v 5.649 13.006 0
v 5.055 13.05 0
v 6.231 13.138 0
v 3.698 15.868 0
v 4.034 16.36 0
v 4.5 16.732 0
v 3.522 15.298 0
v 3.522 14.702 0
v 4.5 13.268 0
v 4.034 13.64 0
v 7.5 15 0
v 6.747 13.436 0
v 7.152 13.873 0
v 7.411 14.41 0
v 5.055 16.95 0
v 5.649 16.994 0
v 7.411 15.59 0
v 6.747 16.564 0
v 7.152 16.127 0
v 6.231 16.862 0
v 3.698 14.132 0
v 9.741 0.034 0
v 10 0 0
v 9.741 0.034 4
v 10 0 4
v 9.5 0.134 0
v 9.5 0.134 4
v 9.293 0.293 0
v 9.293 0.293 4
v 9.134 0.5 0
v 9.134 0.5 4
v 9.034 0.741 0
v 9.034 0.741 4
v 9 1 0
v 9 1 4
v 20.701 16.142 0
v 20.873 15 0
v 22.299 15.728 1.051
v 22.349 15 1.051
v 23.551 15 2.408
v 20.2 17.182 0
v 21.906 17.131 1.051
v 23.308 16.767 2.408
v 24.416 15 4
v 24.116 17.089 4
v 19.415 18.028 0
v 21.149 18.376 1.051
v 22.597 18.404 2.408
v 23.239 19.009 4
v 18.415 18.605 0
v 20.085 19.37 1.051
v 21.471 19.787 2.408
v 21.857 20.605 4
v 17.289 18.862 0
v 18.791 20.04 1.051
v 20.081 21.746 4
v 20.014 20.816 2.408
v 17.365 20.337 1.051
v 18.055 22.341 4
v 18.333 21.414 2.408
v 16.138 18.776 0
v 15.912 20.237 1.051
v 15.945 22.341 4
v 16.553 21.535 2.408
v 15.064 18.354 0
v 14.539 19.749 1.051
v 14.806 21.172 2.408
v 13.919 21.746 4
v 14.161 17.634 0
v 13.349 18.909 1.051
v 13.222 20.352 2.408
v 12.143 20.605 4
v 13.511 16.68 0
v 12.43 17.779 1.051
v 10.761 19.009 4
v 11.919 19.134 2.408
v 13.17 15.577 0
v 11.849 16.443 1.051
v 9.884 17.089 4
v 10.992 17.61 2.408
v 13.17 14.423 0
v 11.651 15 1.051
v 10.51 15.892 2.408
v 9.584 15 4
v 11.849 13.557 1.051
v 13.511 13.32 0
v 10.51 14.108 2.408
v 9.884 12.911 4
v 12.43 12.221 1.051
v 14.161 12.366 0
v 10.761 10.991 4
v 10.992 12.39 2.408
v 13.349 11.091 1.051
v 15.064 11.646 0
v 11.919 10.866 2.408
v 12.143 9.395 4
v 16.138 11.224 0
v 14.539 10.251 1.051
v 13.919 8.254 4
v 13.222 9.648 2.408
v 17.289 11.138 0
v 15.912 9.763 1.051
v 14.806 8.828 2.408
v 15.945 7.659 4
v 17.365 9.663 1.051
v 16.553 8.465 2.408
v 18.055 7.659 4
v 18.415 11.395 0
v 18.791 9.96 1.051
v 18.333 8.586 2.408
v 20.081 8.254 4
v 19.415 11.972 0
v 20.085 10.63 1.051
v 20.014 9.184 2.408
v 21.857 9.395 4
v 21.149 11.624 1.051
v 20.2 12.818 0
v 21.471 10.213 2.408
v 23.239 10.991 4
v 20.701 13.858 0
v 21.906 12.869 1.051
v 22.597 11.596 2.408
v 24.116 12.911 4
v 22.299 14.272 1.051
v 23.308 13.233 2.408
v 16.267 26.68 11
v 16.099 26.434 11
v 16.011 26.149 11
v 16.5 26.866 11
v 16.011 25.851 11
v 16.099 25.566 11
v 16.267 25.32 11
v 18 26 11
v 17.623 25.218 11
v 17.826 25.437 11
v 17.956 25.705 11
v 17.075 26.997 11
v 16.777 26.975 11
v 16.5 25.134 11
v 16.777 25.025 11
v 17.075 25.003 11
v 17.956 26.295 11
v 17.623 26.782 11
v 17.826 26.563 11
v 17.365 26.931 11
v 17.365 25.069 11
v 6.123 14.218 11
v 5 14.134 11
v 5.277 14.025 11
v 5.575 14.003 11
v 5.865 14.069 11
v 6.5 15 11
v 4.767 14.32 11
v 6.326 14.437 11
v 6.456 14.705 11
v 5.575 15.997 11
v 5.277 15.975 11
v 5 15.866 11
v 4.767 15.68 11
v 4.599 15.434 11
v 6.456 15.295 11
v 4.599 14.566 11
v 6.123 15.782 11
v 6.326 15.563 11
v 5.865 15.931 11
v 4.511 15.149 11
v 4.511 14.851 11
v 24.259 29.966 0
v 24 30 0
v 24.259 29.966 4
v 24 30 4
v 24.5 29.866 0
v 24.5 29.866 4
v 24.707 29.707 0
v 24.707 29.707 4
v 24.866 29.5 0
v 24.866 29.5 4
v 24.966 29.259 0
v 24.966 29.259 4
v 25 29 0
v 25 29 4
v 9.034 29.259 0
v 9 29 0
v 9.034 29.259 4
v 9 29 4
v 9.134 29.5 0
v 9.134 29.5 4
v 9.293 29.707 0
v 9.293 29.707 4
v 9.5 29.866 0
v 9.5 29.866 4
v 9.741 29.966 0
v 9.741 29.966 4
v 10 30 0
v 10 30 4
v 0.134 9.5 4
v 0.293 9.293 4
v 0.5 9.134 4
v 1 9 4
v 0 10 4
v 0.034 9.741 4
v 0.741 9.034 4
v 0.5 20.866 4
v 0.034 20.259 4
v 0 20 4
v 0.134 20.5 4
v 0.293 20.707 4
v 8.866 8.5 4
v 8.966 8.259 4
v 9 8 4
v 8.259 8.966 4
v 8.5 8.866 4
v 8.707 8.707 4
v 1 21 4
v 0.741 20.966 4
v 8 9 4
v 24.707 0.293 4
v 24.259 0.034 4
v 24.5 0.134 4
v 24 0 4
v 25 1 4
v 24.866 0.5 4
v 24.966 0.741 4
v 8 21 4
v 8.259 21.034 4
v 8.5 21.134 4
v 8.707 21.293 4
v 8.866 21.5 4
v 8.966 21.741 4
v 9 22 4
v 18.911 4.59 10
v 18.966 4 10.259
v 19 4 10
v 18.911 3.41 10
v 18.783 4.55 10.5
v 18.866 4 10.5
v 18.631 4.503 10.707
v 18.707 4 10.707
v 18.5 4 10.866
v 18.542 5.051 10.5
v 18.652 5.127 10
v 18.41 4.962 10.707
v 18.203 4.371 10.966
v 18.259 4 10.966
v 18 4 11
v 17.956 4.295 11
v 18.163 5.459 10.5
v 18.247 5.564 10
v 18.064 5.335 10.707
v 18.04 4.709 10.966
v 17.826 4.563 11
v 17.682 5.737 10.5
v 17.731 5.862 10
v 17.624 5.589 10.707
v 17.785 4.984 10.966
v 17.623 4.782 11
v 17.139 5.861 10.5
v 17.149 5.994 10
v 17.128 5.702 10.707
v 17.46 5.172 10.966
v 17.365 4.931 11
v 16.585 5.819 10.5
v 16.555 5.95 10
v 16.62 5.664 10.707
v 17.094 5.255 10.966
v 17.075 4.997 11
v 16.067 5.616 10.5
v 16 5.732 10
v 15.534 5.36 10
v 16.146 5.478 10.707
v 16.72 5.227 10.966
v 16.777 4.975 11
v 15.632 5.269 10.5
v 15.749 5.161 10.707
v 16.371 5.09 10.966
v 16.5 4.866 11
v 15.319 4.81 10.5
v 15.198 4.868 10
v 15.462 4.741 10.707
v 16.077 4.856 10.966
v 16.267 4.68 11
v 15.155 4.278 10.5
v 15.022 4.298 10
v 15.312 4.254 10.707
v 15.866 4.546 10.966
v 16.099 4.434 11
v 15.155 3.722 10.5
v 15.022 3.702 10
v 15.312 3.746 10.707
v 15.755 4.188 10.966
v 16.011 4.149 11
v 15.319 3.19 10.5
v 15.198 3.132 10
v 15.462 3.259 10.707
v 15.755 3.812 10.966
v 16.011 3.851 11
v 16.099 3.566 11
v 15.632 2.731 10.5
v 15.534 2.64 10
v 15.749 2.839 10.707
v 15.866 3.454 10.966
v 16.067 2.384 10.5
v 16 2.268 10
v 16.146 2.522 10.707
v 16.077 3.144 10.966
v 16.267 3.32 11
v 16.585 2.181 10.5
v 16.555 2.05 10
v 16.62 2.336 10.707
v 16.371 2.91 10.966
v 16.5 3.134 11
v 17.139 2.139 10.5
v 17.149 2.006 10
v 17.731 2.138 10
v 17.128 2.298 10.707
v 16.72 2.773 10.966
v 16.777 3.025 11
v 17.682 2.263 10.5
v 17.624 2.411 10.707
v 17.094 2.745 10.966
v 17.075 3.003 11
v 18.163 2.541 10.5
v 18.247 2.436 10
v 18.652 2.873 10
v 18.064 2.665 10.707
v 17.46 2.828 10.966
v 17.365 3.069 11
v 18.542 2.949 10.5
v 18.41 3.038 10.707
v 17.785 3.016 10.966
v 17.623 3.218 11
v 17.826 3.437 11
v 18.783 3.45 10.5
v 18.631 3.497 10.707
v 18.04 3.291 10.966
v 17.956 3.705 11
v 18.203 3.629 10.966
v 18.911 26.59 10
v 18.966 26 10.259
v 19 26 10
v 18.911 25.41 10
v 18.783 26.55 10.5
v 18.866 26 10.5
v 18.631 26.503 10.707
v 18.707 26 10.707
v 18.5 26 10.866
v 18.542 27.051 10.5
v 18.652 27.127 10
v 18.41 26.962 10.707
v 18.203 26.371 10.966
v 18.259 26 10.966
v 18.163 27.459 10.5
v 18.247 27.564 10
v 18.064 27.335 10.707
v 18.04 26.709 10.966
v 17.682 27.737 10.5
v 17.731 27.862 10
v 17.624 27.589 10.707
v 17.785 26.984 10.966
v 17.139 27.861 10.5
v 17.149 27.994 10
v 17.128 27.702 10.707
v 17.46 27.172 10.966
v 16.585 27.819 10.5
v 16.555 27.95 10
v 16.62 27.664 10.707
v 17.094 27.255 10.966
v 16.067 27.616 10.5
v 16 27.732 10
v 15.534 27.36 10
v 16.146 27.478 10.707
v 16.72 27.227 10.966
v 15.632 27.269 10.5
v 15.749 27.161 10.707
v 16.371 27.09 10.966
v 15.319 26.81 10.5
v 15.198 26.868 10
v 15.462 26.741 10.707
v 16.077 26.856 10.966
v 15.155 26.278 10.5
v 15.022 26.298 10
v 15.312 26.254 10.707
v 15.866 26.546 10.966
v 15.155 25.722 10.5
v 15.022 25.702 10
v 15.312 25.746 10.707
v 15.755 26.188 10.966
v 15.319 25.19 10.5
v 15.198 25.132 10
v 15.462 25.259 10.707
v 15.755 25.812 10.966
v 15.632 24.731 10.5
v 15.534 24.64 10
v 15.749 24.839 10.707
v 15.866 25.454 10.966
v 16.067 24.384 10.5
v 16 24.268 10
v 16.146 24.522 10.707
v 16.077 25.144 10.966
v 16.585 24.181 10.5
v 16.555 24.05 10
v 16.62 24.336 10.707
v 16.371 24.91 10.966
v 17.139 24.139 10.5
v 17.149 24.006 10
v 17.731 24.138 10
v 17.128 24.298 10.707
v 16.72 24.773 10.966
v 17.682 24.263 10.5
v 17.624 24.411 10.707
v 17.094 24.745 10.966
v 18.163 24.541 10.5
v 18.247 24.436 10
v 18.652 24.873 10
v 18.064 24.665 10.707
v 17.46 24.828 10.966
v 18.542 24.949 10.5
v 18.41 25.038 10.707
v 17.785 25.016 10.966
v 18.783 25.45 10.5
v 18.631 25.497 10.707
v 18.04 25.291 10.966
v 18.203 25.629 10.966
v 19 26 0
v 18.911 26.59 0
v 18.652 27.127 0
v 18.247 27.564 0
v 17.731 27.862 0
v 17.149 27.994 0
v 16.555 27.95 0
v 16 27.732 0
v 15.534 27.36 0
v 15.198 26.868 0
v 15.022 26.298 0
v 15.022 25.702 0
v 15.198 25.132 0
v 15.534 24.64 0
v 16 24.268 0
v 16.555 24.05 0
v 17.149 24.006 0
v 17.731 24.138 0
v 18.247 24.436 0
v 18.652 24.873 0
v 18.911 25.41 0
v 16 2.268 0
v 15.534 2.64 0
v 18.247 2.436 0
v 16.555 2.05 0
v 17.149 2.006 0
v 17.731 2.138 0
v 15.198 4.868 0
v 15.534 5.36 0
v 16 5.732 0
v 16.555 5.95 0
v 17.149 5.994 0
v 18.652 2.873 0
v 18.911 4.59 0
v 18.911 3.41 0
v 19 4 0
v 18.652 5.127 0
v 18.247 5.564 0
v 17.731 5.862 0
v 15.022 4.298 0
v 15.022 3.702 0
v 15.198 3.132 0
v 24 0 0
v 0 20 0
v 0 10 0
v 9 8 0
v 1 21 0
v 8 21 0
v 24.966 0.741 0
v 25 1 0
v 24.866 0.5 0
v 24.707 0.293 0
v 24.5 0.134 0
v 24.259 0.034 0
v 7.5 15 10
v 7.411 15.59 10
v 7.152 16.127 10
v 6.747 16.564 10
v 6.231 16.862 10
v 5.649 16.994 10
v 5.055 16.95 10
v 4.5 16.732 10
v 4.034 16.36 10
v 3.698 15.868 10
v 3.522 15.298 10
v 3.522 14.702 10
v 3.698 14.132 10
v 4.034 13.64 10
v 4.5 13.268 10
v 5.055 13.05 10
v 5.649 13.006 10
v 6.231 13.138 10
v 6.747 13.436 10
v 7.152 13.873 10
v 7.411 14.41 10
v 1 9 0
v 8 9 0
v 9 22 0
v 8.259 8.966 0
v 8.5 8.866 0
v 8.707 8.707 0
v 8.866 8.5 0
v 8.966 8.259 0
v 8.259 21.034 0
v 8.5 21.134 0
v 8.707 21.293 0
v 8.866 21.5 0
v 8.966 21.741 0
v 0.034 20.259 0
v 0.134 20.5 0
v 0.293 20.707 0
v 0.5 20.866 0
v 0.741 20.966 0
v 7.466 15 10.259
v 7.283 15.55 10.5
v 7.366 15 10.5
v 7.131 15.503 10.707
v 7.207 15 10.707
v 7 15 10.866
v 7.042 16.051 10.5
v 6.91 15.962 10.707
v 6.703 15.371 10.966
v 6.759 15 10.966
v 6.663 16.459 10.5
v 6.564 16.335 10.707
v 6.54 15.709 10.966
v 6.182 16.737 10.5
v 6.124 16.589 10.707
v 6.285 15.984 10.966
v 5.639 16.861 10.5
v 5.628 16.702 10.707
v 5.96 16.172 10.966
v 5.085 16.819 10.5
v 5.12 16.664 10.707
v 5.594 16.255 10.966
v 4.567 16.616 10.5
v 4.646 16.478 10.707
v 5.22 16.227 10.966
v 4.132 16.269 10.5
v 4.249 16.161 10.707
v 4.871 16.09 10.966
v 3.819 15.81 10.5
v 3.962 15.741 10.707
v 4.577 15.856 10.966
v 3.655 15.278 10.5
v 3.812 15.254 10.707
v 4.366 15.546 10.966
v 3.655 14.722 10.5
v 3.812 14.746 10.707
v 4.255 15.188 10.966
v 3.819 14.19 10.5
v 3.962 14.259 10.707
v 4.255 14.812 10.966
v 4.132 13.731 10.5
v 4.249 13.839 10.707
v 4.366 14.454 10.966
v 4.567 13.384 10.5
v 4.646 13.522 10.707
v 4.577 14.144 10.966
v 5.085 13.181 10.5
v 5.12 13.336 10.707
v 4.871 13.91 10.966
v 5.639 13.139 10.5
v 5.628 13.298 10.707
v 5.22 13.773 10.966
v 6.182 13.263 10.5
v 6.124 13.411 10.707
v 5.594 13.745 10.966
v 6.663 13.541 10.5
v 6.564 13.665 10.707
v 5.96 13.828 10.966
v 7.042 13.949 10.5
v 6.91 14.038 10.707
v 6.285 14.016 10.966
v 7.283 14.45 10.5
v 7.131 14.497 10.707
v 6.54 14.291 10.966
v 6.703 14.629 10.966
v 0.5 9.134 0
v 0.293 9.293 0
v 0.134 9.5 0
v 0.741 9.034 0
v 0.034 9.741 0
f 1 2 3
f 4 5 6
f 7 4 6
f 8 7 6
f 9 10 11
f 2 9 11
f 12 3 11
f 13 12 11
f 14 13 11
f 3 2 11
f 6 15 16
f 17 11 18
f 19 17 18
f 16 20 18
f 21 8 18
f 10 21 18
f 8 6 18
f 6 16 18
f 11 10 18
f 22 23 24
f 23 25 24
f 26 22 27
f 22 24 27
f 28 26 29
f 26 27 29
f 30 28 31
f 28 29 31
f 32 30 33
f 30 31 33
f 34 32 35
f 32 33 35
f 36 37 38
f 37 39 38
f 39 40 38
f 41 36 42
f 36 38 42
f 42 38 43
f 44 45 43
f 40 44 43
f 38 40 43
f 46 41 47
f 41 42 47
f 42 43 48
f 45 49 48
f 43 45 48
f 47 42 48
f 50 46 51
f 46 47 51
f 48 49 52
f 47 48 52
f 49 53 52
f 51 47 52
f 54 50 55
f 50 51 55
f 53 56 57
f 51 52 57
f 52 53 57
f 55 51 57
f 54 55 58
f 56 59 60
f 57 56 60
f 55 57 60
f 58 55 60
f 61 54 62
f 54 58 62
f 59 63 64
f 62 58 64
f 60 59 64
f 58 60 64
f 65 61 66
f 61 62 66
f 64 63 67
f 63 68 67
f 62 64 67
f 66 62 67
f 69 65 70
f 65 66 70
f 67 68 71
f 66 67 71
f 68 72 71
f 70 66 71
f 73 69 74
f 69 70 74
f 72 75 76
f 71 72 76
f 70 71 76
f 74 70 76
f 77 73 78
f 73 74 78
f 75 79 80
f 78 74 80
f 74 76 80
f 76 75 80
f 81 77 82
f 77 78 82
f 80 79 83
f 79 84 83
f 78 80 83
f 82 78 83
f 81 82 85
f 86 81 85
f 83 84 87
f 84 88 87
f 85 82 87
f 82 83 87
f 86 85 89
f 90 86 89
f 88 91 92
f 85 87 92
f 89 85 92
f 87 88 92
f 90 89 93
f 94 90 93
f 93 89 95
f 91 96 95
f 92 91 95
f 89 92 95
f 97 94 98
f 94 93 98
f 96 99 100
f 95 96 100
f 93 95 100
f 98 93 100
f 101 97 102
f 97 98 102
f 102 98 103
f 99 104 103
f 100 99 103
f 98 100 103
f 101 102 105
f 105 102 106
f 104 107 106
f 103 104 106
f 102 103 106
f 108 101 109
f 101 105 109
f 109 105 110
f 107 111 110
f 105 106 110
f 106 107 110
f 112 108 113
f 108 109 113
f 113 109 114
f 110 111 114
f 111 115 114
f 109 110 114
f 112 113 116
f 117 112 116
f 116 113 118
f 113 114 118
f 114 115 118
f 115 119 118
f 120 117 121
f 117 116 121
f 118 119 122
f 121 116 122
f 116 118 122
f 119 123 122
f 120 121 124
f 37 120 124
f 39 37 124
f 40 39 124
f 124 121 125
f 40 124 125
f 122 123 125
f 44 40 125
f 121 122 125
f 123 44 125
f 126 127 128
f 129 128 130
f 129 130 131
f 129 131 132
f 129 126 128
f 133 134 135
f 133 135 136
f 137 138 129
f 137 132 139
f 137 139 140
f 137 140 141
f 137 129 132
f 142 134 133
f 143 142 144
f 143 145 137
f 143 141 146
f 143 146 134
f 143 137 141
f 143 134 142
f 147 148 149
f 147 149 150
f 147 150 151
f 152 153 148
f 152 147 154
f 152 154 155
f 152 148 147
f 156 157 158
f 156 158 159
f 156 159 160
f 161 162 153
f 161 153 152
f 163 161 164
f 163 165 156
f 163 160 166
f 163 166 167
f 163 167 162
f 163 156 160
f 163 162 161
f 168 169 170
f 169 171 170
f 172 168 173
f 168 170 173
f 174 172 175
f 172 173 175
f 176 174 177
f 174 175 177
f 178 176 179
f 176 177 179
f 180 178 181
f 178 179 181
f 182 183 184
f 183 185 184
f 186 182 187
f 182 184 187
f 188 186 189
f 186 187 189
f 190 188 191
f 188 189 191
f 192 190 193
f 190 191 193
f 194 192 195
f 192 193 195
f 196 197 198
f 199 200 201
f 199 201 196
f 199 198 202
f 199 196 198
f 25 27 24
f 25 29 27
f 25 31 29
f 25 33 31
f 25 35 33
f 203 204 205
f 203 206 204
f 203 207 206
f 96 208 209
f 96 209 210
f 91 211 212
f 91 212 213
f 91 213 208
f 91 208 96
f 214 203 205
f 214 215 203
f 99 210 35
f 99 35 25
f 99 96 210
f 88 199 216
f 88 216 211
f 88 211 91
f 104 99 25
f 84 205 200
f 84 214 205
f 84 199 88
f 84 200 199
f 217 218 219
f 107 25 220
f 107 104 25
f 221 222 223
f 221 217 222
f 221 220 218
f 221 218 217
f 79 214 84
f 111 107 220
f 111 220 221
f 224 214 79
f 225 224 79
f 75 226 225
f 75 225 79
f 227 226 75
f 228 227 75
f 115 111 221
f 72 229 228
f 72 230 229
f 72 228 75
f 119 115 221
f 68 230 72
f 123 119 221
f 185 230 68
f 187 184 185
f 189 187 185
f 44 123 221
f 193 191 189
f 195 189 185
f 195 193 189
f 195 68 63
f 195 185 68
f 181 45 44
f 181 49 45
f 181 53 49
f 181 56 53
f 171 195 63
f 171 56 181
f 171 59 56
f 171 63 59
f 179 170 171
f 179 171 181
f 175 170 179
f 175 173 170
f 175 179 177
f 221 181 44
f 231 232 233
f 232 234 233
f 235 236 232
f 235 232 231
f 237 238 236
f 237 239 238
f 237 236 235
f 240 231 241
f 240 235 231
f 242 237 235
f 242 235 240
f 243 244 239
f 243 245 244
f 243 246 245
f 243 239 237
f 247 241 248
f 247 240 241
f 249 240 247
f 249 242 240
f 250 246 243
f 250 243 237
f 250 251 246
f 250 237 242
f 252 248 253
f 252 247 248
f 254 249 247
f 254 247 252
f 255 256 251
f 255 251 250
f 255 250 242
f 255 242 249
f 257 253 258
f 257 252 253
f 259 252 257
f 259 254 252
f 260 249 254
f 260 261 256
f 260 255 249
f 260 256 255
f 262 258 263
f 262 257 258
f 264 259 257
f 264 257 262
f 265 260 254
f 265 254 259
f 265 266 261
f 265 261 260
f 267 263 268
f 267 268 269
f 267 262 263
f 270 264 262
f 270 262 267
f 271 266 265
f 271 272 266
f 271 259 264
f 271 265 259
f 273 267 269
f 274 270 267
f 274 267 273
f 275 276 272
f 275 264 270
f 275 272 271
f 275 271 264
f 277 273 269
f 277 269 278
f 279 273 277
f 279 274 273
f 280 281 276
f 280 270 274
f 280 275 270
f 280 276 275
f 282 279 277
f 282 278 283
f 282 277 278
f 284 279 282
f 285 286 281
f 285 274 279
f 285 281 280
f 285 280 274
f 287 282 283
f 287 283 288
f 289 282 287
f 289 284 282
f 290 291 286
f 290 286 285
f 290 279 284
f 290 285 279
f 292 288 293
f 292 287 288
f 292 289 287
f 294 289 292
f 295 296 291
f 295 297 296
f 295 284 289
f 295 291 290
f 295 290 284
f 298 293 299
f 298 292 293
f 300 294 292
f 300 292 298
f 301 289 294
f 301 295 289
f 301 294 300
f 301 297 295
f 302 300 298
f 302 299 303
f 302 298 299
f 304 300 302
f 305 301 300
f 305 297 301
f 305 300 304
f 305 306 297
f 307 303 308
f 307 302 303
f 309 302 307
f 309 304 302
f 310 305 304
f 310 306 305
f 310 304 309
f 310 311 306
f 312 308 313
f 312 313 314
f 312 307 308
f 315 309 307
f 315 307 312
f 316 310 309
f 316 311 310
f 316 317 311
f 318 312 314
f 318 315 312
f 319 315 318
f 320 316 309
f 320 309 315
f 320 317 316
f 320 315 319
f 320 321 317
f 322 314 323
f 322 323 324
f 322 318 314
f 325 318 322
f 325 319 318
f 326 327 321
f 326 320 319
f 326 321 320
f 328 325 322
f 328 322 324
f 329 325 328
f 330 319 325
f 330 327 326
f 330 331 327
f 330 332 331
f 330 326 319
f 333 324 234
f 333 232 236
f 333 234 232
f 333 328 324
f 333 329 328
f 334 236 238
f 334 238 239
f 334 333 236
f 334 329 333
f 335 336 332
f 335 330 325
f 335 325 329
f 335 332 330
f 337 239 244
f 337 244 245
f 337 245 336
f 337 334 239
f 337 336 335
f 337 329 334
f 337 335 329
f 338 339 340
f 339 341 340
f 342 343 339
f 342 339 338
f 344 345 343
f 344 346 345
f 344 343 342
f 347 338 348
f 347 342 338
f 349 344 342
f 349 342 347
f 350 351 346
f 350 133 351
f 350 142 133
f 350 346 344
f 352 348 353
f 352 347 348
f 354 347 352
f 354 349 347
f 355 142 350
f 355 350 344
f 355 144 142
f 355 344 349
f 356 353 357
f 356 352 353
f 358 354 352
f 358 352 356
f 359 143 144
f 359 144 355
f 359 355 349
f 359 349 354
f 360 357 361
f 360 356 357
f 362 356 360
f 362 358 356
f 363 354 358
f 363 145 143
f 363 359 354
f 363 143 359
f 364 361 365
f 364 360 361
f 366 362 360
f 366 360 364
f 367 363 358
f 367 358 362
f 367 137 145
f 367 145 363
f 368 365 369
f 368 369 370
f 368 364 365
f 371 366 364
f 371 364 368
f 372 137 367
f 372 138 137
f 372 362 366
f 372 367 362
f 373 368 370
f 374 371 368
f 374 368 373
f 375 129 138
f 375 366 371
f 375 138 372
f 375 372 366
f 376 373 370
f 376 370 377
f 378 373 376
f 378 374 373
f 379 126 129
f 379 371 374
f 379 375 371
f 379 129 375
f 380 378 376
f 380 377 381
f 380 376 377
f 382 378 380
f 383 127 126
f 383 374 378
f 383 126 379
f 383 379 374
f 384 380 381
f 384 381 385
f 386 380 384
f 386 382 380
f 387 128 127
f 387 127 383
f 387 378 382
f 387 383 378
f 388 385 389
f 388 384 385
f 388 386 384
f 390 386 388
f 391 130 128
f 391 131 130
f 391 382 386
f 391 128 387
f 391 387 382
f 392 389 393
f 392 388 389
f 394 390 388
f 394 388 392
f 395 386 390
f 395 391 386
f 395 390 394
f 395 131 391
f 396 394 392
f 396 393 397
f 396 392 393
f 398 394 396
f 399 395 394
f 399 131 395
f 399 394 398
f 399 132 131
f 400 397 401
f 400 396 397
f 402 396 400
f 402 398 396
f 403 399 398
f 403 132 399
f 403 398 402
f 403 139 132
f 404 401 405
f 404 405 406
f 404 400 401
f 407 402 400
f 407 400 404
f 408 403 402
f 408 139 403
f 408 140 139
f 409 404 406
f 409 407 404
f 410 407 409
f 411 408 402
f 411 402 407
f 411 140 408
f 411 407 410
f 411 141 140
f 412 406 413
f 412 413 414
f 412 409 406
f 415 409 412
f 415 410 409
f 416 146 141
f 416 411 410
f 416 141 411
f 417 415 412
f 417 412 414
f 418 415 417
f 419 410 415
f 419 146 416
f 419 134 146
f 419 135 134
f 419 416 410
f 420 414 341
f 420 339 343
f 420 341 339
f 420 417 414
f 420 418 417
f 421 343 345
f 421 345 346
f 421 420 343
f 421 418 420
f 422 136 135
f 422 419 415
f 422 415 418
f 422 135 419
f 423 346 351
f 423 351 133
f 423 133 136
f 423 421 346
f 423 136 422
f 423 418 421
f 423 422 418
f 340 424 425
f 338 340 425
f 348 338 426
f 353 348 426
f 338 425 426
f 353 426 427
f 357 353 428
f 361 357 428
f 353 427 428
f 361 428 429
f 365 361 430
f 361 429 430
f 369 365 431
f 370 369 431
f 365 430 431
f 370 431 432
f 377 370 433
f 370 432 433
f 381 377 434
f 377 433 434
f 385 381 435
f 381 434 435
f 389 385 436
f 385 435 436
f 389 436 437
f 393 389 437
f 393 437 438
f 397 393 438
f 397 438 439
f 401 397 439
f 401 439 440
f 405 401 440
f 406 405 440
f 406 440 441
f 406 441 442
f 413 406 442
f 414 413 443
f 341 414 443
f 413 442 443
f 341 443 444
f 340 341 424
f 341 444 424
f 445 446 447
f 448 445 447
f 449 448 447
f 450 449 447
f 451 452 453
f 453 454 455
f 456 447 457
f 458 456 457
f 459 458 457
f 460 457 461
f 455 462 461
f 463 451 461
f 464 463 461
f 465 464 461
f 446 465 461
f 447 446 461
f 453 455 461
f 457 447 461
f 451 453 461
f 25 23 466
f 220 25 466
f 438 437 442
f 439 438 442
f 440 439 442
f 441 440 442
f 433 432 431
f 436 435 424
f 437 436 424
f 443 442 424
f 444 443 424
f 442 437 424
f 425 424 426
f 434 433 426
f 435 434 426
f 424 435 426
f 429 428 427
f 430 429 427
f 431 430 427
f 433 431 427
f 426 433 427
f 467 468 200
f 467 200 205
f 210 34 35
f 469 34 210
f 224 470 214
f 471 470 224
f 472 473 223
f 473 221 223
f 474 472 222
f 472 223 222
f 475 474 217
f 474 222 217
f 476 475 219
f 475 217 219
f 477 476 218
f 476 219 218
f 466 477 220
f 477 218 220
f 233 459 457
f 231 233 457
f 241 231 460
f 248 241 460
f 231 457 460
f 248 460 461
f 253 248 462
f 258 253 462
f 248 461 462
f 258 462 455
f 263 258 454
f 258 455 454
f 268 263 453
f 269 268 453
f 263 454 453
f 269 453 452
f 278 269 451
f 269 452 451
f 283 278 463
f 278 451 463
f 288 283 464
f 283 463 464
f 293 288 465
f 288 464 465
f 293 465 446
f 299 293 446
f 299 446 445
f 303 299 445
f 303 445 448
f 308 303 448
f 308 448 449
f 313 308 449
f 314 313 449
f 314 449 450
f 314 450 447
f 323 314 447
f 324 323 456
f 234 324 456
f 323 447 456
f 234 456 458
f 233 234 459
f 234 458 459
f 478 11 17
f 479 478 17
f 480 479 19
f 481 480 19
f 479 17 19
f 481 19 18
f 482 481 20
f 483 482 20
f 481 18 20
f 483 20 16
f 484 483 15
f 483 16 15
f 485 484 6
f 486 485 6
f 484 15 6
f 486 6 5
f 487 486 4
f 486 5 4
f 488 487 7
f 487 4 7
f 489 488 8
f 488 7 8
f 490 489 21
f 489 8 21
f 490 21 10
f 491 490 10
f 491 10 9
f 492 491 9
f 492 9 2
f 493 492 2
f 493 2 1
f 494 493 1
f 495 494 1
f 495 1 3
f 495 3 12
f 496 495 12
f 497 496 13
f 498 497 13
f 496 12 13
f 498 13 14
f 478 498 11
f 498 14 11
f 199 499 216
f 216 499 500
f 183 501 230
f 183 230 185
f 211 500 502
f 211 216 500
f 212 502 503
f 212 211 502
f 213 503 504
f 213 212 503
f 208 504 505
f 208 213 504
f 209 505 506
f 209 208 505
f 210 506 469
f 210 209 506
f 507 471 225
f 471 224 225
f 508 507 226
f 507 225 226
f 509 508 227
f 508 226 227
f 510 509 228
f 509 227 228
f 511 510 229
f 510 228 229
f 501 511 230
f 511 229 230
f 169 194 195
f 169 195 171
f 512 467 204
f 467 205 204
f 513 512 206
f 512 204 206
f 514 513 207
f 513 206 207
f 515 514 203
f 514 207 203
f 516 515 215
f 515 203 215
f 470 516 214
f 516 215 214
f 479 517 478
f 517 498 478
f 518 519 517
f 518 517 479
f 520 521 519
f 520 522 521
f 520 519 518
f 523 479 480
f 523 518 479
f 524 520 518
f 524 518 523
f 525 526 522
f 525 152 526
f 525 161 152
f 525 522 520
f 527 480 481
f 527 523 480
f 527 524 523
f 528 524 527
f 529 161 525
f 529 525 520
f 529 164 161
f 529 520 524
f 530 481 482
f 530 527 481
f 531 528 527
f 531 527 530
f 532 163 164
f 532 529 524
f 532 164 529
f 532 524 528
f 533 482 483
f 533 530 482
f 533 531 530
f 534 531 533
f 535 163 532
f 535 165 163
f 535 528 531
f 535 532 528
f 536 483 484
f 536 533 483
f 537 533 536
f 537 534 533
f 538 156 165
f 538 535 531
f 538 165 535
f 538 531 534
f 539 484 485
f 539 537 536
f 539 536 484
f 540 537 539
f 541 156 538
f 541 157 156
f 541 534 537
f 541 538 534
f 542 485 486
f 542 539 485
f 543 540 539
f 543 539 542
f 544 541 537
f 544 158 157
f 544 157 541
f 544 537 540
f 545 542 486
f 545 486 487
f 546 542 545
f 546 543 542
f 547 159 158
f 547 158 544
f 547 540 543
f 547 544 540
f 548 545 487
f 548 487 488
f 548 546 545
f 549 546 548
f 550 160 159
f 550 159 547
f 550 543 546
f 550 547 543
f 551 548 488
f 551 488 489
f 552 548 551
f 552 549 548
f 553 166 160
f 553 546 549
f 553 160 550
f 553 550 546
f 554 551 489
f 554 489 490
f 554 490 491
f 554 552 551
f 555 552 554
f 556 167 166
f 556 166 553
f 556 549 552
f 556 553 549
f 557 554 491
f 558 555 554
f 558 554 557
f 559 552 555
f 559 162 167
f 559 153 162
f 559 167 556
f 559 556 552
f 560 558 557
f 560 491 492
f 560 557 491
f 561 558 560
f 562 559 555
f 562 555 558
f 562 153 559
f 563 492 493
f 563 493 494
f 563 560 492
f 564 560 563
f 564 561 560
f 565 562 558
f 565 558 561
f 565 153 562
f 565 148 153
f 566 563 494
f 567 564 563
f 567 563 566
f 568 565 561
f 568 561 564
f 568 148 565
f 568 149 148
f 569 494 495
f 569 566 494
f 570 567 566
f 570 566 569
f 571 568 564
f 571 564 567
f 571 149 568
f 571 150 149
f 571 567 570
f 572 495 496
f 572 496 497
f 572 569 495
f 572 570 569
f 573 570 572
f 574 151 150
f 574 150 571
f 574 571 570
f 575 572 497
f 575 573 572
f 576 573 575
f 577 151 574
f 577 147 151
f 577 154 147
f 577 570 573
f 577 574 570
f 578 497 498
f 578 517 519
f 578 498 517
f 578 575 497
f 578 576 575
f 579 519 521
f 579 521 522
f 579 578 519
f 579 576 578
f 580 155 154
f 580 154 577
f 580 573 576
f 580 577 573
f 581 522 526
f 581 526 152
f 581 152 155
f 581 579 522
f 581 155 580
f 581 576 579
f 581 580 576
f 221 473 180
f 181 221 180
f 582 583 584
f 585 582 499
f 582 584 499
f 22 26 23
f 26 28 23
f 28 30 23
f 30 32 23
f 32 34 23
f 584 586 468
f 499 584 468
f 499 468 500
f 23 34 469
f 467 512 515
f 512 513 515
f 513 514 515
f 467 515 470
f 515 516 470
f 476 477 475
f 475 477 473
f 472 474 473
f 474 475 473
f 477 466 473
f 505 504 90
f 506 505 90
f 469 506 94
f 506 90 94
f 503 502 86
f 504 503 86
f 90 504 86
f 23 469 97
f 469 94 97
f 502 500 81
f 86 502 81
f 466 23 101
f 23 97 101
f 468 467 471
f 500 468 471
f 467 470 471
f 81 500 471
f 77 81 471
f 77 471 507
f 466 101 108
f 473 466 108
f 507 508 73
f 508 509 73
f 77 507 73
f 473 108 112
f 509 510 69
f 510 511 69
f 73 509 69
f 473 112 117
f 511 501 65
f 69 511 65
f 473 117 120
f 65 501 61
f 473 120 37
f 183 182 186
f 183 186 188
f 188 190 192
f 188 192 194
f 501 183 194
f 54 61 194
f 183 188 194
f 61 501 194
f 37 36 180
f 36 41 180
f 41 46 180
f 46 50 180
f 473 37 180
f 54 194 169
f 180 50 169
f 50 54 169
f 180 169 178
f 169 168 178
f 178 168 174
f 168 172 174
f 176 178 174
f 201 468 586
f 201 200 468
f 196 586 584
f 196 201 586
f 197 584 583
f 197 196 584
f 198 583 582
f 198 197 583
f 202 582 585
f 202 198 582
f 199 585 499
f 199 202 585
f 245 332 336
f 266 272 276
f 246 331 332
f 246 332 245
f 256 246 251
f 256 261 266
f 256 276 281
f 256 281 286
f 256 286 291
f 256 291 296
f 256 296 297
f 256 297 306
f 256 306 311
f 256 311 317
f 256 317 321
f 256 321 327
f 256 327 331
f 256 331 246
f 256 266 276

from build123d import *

# Parameters (mm, degrees)
BOX002_W          = 9
BOX002_H          = 9
BOX002_DEPTH      = 4
BOX001_W          = 9
BOX001_H          = 9
BOX001_DEPTH      = 4
BOX_W             = 25
BOX_H             = 30
BOX_DEPTH         = 4
FILLET_R          = 1
CYLINDER_R        = 2
CYLINDER_DEPTH    = 11
FILLET001_R       = 1
CYLINDER002_R     = 2
CYLINDER002_DEPTH = 11
FILLET002_R       = 1
CYLINDER001_R     = 2
CYLINDER001_DEPTH = 11
FILLET003_R       = 1


with BuildPart() as cube002:
    # Box002 → Box002 (new body)
    with BuildSketch(Plane(origin=(0, 21, 0), x_dir=(1, 0, 0), z_dir=(0, 0, 1))):
        with Locations((4.5, 4.5)):
            Rectangle(BOX002_W, BOX002_H)
    extrude(amount=BOX002_DEPTH)


with BuildPart() as cube001:
    # Box001 → Box001 (new body)
    with BuildSketch(Plane.XY):
        with Locations((4.5, 4.5)):
            Rectangle(BOX001_W, BOX001_H)
    extrude(amount=BOX001_DEPTH)


with BuildPart() as sphere:
    # Sphere → Sphere (revolve)
    with BuildSketch(Plane(origin=(17, 15, 7), x_dir=(1, 0, 0), z_dir=(0, -1, 0))):
        with BuildLine():
            ThreePointArc((0, -8), (8, 0), (0, 8))
            Line((0, 8), (0, -8))
        make_face()
    revolve(axis=Axis((17, 15, 7), (0, 0, 1)))


with BuildPart() as fillet_body:
    # Box → Box (new body)
    with BuildSketch(Plane.XY):
        with Locations((12.5, 15)):
            Rectangle(BOX_W, BOX_H)
    extrude(amount=BOX_DEPTH)

    # Cut: cut Sphere
    add(sphere.part, mode=Mode.SUBTRACT)

    # Cut001: cut Cube001
    add(cube001.part, mode=Mode.SUBTRACT)

    # Cut002: cut Cube002
    add(cube002.part, mode=Mode.SUBTRACT)

    # Fillet
    fillet_edges = [fillet_body.edges().sort_by_distance(p)[0] for p in [
        (0, 21, 2),
        (0, 9, 2),
        (9, 21, 2),
        (9, 9, 2),
        (9, 30, 2),
        (25, 30, 2),
        (25, 0, 2),
        (9, 0, 2),
    ]]
    fillet(fillet_edges, radius=FILLET_R)


with BuildPart() as fillet001:
    # Cylinder → Cylinder (new body)
    with BuildSketch(Plane(origin=(5.5, 15, 0), x_dir=(1, 0, 0), z_dir=(0, 0, 1))):
        Circle(CYLINDER_R)
    extrude(amount=CYLINDER_DEPTH)

    # Fillet001
    fillet001_edges = [fillet001.edges().sort_by_distance(p)[0] for p in [
        (3.5, 15, 11),
    ]]
    fillet(fillet001_edges, radius=FILLET001_R)


with BuildPart() as fillet002:
    # Cylinder002 → Cylinder002 (new body)
    with BuildSketch(Plane(origin=(17, 4, 0), x_dir=(1, 0, 0), z_dir=(0, 0, 1))):
        Circle(CYLINDER002_R)
    extrude(amount=CYLINDER002_DEPTH)

    # Fillet002
    fillet002_edges = [fillet002.edges().sort_by_distance(p)[0] for p in [
        (15, 4, 11),
    ]]
    fillet(fillet002_edges, radius=FILLET002_R)


with BuildPart() as fillet003:
    # Cylinder001 → Cylinder001 (new body)
    with BuildSketch(Plane(origin=(17, 26, 0), x_dir=(1, 0, 0), z_dir=(0, 0, 1))):
        Circle(CYLINDER001_R)
    extrude(amount=CYLINDER001_DEPTH)

    # Fillet003
    fillet003_edges = [fillet003.edges().sort_by_distance(p)[0] for p in [
        (15, 26, 11),
    ]]
    fillet(fillet003_edges, radius=FILLET003_R)


solid = Compound([fillet_body.part, fillet001.part, fillet002.part, fillet003.part])
